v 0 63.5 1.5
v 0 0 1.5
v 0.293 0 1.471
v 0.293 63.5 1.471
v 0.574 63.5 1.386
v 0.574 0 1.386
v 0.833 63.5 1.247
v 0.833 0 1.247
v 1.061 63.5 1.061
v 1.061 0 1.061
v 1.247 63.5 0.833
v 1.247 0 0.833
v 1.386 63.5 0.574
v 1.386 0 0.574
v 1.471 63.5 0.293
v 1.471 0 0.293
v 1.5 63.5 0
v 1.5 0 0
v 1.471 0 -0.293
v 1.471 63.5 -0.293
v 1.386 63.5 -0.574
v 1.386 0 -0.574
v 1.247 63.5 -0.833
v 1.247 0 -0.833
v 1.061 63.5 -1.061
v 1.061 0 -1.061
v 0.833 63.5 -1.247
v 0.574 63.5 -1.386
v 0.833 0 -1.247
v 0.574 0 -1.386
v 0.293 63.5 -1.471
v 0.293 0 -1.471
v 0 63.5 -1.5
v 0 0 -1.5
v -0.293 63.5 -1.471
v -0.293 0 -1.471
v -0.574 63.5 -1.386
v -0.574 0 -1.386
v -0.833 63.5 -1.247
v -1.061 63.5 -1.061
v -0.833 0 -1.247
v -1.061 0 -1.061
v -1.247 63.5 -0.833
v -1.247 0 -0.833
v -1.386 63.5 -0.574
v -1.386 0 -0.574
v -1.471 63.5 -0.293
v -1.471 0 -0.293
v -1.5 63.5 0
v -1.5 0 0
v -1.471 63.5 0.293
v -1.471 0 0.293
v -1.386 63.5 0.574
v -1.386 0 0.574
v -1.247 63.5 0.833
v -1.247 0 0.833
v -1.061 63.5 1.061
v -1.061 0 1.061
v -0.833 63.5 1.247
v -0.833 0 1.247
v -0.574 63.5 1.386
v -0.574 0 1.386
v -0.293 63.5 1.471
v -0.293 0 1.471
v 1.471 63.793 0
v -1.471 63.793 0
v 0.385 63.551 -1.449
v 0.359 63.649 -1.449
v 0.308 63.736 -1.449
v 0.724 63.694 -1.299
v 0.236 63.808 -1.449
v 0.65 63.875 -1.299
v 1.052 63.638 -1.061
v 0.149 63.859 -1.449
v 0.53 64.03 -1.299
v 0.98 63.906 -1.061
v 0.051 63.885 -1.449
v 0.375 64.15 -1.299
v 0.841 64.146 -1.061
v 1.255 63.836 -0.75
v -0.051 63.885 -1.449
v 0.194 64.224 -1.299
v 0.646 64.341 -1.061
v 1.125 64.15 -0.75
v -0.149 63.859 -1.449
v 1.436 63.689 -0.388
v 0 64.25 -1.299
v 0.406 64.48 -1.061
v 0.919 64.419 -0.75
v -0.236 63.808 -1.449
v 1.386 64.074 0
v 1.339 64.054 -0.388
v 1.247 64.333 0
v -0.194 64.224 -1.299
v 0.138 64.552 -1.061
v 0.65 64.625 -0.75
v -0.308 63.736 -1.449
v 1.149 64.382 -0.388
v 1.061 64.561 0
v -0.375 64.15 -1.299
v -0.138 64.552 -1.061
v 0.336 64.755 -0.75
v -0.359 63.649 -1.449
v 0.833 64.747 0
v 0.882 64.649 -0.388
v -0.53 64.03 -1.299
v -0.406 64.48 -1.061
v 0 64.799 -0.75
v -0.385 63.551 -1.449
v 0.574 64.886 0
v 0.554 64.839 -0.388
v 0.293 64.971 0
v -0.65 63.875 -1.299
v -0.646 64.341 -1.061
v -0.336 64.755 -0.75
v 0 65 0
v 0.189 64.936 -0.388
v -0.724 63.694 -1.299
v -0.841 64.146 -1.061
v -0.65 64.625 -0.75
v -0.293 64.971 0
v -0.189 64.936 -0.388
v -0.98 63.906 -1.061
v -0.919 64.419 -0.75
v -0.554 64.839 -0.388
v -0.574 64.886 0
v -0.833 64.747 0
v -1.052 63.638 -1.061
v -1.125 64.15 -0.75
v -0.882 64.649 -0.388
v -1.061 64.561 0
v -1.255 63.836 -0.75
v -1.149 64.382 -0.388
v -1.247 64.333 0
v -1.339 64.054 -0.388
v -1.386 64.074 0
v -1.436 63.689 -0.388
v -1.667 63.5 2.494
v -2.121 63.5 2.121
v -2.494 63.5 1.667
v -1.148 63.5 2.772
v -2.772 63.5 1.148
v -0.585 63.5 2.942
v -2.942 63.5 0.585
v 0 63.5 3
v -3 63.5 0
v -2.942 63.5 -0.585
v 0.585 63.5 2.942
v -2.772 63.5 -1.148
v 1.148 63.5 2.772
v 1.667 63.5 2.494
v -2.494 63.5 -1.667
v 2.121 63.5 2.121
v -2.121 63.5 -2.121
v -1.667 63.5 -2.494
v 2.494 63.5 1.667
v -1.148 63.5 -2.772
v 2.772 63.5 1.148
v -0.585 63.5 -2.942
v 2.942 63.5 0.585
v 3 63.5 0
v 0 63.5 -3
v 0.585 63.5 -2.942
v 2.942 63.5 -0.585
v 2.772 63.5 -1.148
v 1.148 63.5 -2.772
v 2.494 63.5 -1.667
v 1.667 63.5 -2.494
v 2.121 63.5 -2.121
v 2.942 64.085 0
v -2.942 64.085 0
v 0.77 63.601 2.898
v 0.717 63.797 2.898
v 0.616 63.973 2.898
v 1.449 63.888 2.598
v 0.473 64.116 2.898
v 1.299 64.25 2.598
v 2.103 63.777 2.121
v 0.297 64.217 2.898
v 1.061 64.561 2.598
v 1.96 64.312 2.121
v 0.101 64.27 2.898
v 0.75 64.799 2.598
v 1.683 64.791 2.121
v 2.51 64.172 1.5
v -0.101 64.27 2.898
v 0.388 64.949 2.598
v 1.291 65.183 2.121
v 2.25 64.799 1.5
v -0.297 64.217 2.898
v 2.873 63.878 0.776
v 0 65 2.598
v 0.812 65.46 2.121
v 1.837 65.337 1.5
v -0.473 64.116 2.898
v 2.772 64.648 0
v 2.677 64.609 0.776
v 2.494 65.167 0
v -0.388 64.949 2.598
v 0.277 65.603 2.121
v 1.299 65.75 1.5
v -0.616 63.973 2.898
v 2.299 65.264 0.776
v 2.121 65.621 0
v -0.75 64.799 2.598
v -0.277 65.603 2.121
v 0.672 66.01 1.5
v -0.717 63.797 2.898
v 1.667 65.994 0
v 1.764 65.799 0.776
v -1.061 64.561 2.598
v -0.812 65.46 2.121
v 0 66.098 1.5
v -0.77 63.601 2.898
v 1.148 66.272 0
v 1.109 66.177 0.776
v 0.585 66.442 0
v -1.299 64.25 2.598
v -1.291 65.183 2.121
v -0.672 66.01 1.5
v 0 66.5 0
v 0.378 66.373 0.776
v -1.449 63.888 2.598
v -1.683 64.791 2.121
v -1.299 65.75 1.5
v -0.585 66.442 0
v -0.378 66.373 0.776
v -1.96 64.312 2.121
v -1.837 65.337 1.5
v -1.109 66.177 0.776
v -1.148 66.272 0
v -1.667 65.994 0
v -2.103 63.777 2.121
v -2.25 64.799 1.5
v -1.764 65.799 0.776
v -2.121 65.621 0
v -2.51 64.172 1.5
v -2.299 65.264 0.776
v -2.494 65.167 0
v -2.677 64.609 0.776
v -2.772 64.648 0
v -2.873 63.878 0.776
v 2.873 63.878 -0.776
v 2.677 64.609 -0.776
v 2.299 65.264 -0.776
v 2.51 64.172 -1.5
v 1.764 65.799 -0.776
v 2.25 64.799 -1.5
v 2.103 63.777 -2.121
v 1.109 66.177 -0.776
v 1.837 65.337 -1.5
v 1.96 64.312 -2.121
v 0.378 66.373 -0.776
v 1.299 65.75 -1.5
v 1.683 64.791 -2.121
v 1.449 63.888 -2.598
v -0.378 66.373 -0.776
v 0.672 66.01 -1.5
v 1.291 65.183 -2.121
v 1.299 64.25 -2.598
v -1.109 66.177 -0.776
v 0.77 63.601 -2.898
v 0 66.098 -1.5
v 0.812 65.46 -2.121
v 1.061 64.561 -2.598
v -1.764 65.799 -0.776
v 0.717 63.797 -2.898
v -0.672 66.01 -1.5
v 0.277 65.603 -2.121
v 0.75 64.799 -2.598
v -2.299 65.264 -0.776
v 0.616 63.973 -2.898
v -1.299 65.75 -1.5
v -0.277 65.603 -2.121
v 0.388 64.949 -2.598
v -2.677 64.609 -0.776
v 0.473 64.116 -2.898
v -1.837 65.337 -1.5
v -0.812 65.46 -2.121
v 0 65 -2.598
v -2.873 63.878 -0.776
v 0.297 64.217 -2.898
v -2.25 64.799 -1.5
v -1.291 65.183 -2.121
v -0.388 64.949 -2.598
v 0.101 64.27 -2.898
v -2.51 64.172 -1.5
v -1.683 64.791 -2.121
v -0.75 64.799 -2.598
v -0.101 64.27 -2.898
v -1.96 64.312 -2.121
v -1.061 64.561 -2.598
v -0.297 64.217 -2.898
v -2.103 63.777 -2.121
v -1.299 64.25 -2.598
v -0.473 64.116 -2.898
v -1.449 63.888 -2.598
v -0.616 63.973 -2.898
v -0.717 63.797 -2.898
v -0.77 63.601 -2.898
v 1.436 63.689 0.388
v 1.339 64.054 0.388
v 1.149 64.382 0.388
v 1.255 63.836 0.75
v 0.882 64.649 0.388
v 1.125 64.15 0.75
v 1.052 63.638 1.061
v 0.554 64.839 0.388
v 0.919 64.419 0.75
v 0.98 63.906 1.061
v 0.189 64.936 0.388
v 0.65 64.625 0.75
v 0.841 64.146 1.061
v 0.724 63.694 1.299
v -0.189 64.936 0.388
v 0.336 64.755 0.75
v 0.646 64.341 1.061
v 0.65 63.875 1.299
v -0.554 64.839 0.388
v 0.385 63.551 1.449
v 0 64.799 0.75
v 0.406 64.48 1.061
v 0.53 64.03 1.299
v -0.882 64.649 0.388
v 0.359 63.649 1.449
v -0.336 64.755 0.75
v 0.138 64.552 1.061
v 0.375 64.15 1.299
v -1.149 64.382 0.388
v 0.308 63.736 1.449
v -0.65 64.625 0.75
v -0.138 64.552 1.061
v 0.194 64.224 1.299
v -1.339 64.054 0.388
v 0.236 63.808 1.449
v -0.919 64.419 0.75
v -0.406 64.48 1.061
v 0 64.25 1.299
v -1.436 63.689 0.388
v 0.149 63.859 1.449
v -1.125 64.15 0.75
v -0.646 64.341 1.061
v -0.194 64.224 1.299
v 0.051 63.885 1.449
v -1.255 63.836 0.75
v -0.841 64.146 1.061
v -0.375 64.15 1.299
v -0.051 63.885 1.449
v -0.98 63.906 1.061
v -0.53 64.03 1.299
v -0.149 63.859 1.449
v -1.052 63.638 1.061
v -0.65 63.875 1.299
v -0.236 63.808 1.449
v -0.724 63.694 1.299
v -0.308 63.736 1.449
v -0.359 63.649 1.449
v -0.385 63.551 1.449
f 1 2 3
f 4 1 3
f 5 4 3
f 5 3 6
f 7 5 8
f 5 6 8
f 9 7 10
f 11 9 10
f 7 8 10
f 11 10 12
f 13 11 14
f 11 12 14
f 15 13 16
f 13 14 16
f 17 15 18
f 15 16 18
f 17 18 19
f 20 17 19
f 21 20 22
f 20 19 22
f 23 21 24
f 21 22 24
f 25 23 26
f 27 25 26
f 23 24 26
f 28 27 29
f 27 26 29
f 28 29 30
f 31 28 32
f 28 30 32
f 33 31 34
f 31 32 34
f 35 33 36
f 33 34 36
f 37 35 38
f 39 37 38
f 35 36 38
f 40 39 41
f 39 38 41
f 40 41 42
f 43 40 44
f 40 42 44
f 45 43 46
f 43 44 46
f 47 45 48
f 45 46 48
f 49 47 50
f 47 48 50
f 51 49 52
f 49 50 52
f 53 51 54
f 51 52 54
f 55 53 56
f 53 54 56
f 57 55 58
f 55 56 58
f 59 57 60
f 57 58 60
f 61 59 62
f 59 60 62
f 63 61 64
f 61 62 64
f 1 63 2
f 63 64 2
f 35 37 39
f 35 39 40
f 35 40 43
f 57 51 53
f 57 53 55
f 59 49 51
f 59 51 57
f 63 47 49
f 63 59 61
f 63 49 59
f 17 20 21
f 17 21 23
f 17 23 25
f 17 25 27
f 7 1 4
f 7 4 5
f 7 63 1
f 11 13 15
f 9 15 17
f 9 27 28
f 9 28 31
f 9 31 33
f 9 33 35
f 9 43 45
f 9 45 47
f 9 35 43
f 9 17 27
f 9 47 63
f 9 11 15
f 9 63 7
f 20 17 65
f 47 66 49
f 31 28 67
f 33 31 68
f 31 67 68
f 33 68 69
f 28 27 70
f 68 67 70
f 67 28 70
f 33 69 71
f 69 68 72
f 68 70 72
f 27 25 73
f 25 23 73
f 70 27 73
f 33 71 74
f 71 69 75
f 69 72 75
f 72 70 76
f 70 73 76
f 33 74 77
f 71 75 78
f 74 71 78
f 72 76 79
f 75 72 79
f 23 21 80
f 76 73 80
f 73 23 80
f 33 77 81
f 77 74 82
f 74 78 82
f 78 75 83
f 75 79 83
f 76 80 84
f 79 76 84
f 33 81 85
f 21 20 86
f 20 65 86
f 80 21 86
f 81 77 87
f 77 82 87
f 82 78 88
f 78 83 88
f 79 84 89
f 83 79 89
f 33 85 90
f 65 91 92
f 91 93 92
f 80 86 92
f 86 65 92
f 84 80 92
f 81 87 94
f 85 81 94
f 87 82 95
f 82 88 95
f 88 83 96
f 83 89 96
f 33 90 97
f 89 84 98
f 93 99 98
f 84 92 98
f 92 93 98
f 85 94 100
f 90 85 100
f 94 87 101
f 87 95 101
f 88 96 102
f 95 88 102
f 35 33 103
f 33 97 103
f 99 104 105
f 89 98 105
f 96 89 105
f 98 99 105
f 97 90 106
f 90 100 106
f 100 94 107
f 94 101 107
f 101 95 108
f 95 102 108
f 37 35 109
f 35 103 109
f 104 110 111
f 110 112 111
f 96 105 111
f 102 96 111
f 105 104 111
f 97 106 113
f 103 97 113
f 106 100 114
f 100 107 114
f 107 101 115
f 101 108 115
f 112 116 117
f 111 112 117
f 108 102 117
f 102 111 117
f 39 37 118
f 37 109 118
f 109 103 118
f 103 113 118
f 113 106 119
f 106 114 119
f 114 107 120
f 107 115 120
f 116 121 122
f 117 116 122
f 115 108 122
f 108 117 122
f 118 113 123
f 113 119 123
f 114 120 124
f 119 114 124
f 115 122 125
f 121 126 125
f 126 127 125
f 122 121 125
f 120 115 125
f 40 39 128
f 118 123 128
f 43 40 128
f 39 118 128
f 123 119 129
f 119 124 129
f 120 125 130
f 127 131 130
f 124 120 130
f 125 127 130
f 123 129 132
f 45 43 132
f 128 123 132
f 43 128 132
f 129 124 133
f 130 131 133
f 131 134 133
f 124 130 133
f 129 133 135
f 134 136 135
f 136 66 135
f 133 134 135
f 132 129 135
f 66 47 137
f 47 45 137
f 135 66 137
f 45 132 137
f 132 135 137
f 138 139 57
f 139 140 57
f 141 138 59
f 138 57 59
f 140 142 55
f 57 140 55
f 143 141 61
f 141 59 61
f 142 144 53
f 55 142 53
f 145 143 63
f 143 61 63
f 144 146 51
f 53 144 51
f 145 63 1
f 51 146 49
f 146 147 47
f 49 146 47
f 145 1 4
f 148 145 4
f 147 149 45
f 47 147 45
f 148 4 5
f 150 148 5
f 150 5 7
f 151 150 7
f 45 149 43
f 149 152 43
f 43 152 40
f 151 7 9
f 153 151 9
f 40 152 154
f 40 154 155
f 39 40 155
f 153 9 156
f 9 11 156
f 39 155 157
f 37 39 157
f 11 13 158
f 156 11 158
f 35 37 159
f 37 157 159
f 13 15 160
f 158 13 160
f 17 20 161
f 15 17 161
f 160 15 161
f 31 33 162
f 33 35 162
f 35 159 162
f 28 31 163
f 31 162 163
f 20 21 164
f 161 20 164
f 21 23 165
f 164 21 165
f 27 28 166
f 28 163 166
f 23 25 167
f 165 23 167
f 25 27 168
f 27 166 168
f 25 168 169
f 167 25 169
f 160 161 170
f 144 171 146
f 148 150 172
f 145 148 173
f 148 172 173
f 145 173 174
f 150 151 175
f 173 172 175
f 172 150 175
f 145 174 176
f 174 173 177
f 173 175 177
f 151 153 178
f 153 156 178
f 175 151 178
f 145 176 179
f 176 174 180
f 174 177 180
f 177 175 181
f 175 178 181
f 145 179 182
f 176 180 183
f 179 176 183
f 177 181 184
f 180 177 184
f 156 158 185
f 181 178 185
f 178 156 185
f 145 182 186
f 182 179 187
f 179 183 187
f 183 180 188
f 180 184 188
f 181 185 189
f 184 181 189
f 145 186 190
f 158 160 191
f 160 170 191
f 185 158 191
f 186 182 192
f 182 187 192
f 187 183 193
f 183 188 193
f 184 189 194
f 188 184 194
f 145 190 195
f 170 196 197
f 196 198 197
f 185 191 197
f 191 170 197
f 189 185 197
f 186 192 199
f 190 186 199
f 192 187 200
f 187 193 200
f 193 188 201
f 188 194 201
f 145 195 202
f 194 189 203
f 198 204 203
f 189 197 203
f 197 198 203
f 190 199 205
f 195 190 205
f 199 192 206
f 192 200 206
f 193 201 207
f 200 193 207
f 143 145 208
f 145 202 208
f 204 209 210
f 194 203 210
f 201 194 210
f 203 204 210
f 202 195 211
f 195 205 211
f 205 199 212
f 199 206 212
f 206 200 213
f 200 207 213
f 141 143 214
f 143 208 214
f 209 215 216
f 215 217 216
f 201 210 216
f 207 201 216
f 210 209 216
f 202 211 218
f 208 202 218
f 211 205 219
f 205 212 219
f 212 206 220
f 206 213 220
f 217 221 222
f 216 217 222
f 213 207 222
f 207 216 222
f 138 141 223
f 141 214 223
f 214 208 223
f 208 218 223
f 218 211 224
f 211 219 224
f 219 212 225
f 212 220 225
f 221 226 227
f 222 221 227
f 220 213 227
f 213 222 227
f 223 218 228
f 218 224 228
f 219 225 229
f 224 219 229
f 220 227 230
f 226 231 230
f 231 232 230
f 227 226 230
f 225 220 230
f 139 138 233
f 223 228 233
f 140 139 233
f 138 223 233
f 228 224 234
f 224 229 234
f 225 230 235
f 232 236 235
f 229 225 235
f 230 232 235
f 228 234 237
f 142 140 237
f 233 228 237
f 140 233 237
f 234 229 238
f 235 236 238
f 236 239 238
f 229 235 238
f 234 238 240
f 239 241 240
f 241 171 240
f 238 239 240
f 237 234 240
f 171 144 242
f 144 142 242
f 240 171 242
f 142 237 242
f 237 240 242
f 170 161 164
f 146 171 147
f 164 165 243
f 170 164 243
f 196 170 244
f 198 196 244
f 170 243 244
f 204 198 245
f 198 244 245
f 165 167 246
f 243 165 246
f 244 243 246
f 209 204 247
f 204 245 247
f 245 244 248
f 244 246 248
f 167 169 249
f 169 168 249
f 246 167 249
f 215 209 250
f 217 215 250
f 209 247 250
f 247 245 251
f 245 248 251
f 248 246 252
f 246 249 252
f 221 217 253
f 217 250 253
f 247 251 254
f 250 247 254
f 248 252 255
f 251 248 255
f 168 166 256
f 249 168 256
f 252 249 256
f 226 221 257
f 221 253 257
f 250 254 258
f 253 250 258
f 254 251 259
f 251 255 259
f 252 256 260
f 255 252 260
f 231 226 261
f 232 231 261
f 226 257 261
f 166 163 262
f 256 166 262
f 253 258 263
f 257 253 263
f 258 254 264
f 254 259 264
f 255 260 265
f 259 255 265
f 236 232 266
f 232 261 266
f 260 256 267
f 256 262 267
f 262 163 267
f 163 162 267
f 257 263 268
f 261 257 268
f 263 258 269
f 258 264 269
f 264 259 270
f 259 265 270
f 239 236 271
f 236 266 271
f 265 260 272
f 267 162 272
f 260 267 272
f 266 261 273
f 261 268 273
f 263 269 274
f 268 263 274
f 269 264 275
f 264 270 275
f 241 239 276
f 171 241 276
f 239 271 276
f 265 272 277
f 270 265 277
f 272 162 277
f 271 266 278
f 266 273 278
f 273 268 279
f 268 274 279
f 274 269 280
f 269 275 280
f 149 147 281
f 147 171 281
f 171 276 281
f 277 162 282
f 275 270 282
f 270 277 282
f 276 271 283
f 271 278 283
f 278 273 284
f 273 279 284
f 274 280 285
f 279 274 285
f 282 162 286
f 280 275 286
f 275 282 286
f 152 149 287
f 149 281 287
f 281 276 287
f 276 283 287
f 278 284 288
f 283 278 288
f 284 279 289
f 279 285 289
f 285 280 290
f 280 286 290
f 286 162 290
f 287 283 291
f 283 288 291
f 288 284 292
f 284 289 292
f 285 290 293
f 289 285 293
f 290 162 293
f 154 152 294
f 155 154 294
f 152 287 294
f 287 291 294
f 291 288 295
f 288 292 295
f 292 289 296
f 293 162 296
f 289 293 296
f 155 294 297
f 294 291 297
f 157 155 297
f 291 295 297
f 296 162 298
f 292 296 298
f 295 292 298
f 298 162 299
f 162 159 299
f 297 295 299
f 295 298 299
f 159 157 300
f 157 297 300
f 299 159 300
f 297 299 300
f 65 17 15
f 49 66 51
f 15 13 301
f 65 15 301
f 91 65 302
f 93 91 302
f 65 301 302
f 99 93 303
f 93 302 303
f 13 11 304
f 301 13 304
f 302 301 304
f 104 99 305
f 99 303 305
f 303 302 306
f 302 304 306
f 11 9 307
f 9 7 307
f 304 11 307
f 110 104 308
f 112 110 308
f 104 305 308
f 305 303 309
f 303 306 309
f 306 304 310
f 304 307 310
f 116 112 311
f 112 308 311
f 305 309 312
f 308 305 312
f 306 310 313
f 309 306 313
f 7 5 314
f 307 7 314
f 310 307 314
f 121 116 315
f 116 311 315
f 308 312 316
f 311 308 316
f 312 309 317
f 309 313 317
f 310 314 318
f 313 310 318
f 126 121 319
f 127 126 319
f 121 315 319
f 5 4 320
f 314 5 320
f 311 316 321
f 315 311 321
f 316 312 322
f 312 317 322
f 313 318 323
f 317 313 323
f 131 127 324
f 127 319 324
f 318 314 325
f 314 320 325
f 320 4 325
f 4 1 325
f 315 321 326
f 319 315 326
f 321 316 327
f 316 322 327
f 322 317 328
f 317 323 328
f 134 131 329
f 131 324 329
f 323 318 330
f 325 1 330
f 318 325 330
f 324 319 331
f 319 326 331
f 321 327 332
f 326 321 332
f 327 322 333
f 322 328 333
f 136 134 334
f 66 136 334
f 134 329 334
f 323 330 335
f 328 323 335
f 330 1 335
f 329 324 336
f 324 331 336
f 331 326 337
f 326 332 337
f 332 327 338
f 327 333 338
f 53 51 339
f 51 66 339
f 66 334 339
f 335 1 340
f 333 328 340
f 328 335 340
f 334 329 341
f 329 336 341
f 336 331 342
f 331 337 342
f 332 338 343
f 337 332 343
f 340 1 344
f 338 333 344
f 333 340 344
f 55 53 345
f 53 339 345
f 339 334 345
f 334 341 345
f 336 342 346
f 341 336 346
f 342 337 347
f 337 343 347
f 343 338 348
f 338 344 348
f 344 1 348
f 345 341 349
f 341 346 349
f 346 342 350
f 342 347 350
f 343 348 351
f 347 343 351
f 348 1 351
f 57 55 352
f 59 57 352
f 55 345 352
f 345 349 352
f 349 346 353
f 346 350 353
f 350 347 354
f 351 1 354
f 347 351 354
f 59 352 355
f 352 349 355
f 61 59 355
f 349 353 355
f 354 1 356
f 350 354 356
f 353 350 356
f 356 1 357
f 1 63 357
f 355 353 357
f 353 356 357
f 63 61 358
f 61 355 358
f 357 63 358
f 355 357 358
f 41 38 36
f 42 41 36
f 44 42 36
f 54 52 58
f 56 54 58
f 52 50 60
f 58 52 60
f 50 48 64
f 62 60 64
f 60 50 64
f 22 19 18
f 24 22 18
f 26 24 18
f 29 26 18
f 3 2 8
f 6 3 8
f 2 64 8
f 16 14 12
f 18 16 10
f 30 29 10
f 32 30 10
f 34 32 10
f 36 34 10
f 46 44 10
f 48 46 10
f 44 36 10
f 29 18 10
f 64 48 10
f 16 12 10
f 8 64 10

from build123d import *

# Parameters (mm, degrees)
SKETCH1_R           = 1.5
BOSS_EXTRUDE1_DEPTH = 63.5
REVOLVE1_ANGLE      = 180


with BuildPart() as part:
    # Sketch1 → Boss-Extrude1 (new body)
    with BuildSketch(Plane(origin=(0, 0, 0), x_dir=(1, 0, 0), z_dir=(0, 1, 0))):
        with Locations(Location((0, 0, 0), (0, 0, 270))):
            Circle(SKETCH1_R)
    extrude(amount=BOSS_EXTRUDE1_DEPTH)


with BuildPart() as body_2:
    # Sketch4 → Revolve1 (revolve)
    with BuildSketch(Plane(origin=(0, 63.5, 0), x_dir=(1, 0, 0), z_dir=(0, 1, 0))):
        with BuildLine():
            ThreePointArc((3, 0), (2.121320344, 2.121320344), (0, 3))
            Line((0, 3), (0, 1.5))
            ThreePointArc((0, 1.5), (1.060660172, 1.060660172), (1.5, 0))
            ThreePointArc((1.5, 0), (1.060660172, -1.060660172), (0, -1.5))
            Line((0, -1.5), (0, -3))
            ThreePointArc((0, -3), (2.121320344, -2.121320344), (3, 0))
        make_face()
    revolve(axis=Axis((0, 63.5, -3), (0, 0, 1)), revolution_arc=REVOLVE1_ANGLE)


solid = Compound([part.part, body_2.part])
